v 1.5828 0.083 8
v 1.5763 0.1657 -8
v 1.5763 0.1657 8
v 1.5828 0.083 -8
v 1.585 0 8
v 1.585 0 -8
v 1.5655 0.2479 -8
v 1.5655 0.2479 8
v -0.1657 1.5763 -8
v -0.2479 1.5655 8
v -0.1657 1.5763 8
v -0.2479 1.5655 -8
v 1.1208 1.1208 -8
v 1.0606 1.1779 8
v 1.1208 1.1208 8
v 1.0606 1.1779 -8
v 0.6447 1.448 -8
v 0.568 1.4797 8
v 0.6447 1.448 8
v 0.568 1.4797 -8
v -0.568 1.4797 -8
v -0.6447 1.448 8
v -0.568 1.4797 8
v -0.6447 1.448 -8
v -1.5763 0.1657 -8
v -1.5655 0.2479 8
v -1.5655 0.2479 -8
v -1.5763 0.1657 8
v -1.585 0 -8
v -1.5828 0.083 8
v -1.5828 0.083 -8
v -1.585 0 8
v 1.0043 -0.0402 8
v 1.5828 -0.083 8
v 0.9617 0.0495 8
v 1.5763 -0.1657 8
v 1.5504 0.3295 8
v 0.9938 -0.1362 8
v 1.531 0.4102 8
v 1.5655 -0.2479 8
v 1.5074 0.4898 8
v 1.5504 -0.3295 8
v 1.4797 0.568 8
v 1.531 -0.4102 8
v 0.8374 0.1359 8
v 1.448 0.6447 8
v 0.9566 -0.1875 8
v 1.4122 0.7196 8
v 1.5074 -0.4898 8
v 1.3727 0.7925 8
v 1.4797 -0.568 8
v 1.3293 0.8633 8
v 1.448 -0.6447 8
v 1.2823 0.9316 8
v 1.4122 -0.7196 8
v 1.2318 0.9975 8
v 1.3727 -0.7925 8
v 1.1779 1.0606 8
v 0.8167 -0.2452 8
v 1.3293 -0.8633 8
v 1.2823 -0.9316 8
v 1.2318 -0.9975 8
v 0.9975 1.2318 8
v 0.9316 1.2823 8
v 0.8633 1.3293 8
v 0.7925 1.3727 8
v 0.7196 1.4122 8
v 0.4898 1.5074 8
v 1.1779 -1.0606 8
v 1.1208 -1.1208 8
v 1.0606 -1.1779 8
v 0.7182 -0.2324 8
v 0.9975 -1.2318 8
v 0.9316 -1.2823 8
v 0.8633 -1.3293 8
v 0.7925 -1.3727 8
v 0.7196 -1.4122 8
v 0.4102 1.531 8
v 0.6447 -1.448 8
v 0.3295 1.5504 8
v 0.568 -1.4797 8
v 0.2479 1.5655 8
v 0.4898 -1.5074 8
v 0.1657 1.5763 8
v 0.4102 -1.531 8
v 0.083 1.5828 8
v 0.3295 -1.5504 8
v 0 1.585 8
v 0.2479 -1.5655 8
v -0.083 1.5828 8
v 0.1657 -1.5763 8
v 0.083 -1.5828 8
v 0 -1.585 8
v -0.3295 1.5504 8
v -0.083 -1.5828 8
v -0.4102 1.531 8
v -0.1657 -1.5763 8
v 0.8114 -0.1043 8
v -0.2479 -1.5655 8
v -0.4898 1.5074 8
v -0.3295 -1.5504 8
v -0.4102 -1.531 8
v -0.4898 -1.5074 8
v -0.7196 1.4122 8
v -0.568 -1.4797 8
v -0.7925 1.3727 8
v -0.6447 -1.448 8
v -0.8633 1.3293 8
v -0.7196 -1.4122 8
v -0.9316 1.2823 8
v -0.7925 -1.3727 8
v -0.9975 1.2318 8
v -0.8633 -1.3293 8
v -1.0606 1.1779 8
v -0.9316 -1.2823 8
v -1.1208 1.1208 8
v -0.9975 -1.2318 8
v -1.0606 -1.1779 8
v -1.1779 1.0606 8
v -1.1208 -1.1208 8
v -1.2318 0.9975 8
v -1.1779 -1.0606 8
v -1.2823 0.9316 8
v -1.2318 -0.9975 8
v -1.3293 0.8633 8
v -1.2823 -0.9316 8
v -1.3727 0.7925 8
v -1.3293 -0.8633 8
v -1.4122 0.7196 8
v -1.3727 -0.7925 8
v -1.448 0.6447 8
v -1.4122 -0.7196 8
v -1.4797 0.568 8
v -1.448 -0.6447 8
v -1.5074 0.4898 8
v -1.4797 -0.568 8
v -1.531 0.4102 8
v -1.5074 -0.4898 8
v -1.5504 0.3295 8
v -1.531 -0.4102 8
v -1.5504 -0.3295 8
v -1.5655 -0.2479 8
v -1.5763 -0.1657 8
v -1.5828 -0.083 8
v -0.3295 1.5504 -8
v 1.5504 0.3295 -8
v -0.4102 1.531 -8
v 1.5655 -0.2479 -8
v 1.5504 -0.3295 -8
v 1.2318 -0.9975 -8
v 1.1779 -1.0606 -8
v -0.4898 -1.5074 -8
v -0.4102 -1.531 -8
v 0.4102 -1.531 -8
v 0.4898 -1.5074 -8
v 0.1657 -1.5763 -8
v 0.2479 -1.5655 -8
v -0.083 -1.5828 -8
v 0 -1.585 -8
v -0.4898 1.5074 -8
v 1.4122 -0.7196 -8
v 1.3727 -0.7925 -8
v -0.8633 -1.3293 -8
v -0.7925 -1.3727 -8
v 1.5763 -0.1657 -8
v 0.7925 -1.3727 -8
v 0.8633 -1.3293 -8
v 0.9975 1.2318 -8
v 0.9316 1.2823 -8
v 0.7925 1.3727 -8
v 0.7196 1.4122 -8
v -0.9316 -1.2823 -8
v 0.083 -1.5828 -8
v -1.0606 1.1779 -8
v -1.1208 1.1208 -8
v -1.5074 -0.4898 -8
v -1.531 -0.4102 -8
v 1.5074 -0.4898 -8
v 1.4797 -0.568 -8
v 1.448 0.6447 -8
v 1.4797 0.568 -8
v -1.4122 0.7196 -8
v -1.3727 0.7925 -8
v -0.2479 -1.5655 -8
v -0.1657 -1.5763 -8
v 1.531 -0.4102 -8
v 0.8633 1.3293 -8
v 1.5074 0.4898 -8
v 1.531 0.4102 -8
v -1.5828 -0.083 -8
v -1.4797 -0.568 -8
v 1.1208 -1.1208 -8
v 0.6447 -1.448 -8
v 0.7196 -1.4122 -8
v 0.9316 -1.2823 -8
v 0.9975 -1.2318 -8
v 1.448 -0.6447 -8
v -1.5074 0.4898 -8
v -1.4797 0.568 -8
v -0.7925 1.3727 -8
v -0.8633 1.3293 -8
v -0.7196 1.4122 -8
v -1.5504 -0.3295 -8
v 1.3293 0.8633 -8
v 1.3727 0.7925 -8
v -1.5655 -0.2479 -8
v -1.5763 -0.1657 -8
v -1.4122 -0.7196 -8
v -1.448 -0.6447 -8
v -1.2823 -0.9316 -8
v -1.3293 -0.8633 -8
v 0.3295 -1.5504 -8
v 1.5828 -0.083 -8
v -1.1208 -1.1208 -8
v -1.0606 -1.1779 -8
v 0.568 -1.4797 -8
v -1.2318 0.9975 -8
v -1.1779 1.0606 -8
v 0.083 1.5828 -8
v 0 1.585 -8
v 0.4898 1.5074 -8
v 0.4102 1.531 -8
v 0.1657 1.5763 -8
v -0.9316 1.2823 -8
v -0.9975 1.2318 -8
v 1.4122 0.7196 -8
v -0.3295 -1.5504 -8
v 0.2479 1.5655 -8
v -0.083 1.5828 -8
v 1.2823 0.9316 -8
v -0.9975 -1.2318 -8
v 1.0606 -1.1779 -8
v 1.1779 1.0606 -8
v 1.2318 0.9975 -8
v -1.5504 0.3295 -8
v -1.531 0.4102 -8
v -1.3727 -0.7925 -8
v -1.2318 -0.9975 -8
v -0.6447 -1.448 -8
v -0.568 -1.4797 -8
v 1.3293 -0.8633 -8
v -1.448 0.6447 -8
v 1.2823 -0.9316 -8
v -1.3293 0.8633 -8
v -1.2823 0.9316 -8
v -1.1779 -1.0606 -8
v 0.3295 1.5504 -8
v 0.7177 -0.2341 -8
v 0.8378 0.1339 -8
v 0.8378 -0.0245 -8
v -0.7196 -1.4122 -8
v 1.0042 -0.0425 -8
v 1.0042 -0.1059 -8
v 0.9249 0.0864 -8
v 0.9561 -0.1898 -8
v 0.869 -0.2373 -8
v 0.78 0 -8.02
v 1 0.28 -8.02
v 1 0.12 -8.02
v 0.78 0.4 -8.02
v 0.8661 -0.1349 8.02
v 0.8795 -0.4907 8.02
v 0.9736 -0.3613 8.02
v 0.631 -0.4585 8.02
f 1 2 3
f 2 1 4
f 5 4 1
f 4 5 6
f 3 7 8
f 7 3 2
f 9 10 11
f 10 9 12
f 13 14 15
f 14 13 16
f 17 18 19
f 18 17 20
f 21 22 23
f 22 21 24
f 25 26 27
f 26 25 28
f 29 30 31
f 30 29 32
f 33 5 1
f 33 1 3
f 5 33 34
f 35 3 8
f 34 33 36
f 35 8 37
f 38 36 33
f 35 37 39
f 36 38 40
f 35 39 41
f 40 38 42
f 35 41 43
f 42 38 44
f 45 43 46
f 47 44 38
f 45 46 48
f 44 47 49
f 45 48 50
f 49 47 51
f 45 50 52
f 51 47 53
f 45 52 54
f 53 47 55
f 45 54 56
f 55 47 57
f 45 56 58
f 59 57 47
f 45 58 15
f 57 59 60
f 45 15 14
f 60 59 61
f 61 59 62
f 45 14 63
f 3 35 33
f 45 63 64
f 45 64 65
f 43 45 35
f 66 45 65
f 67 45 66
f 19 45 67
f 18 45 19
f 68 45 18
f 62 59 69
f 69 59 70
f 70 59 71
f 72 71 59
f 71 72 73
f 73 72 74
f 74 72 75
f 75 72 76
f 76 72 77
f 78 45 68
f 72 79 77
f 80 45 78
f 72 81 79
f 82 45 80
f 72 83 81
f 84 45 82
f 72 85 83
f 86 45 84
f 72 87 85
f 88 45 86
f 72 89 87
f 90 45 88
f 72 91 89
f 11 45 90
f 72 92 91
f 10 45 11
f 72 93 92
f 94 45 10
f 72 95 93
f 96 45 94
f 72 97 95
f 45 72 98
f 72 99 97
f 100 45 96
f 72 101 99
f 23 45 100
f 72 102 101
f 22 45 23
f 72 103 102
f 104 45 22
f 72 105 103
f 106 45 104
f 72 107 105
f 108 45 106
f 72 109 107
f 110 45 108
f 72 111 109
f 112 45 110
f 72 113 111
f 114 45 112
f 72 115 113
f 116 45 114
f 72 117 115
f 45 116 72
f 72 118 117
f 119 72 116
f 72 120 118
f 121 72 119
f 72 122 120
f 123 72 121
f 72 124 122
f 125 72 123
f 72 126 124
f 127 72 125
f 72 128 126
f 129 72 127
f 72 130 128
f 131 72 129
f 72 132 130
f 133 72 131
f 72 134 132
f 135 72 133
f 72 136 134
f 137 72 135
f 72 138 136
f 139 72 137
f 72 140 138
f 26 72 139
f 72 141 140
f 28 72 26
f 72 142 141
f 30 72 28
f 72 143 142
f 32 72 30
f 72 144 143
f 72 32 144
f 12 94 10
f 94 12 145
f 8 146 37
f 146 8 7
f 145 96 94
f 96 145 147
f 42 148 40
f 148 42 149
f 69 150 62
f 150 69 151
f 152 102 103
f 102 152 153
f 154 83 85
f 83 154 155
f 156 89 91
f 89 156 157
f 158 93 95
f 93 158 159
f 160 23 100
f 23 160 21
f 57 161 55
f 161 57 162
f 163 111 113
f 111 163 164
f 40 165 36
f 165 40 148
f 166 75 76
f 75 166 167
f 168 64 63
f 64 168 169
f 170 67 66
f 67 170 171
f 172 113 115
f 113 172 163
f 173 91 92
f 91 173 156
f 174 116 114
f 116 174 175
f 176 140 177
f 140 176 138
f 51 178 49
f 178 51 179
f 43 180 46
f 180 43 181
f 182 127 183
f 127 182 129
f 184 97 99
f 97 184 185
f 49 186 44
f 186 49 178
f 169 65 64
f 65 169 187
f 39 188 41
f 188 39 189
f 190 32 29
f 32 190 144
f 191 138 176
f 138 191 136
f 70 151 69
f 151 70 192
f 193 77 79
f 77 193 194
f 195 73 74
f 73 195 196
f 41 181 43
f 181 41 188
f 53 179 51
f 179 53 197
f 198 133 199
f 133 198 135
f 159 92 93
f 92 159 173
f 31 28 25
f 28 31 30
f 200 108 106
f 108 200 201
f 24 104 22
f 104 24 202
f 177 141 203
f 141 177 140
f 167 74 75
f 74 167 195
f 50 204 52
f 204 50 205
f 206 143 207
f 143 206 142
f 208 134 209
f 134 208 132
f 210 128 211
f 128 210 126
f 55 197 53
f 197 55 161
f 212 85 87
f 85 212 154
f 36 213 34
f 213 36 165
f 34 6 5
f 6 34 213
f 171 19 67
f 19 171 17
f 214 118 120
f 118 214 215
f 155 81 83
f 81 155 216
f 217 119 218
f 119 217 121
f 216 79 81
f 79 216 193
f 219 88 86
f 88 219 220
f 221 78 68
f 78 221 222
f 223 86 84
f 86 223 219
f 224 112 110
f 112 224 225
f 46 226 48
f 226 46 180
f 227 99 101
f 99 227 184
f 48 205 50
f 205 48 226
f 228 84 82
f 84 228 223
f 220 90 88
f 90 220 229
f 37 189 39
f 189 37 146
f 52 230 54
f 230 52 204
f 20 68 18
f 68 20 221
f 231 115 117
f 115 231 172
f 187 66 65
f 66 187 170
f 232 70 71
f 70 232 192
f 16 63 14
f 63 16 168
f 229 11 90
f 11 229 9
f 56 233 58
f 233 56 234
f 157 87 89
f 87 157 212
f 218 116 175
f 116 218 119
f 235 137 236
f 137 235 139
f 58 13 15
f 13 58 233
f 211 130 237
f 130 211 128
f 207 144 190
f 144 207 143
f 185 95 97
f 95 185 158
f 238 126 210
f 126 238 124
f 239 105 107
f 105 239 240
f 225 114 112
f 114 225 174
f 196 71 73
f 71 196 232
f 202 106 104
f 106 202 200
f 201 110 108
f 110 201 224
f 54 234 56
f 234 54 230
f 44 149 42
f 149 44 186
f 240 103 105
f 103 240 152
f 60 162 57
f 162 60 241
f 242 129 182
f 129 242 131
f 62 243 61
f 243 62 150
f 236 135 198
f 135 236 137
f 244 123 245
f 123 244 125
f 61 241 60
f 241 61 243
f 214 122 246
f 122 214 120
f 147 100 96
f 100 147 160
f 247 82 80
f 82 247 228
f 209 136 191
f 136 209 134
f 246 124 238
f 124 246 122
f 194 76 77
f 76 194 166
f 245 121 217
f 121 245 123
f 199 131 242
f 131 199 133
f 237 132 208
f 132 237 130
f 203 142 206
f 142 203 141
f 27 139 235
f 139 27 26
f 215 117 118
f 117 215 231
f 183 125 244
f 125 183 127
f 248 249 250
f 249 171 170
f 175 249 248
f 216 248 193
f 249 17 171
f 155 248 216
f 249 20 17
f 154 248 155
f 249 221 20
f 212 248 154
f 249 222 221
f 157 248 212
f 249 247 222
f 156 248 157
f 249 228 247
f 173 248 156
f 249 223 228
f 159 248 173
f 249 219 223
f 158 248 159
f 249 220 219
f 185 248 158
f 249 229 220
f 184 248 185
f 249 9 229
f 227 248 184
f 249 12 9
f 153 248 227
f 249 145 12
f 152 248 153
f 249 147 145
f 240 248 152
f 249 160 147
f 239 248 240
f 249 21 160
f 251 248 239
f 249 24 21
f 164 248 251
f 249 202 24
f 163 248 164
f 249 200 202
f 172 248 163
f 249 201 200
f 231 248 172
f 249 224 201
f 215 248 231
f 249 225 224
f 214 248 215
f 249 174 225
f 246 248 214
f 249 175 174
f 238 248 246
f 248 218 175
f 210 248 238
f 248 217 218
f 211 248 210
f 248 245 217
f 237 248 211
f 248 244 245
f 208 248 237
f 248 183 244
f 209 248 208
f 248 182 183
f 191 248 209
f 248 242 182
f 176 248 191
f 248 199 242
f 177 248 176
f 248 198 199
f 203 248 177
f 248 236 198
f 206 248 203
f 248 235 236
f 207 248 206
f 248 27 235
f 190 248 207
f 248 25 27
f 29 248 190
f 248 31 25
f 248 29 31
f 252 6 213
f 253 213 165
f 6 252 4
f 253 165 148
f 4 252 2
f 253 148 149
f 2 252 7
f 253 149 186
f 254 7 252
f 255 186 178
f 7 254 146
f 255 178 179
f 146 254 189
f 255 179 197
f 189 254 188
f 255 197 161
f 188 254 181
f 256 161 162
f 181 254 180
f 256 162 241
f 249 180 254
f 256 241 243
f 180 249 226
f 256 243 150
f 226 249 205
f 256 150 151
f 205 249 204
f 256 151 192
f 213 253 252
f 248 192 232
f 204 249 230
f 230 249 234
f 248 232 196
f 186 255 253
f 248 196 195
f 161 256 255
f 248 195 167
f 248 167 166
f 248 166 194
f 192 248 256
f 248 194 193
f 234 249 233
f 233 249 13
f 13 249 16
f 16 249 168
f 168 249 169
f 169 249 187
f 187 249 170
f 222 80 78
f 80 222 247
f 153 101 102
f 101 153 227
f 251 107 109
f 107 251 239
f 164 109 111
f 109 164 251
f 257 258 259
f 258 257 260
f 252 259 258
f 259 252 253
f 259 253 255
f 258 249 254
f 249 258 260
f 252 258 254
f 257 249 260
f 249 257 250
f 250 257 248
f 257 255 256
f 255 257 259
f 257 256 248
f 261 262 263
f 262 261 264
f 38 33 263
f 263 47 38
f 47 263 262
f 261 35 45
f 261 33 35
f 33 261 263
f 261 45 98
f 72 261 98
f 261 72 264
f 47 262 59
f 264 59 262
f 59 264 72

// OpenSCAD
$fn = 120;

// =====================
// Target dimensions (mm)
// =====================
outer_diameter = 3.17;   // standoff body OD
length         = 16.0;   // overall length

// =====================
// Thread spec (approx. M2 external)
// =====================
thread_major_d = 2.0;    // major diameter
thread_pitch   = 0.4;    // pitch
thread_depth   = 0.22;   // radial depth (visual/printable)
thread_flat    = 0.12;   // flat at crest/root (mm)

// =====================
// Standoff layout
// =====================
// Make it a standoff pillar: smooth body with short threaded ends.
thread_end_len = 4.0;    // thread length on each end (mm)
mid_body_len   = length - 2*thread_end_len;

eps = 0.02;

// Derived radii
outer_r      = outer_diameter/2;
thread_r_maj = thread_major_d/2;
thread_r_min = thread_r_maj - thread_depth;

// Clamp to keep thread within the 3.17mm OD envelope
thread_r_maj_clamped = min(thread_r_maj, outer_r - eps);
thread_r_min_clamped = min(thread_r_min, thread_r_maj_clamped - eps);

// External helical thread (single-start) built by twisting a 2D profile along Z
module external_thread(major_r, pitch, len, minor_r, flat=0.12) {
    // 2D profile in (radius, z) plane; swept around Z with twist
    profile = [
        [minor_r, 0],
        [major_r, flat],
        [major_r, pitch - flat],
        [minor_r, pitch]
    ];

    linear_extrude(
        height = len,
        twist  = 360*len/pitch,
        slices = max(12, ceil(len*30)),
        convexity = 10
    )
        polygon(points=profile);
}

// Standoff pillar: smooth body + threaded ends, one connected solid
module standoff_pillar() {
    union() {
        // Main smooth standoff body (full OD)
        cylinder(h=length, r=outer_r, center=true);

        // Add external thread on bottom end (overlaps into body for connectivity)
        translate([0, 0, -length/2 - eps])
            external_thread(
                major_r = thread_r_maj_clamped,
                pitch   = thread_pitch,
                len     = thread_end_len + 2*eps,
                minor_r = thread_r_min_clamped,
                flat    = thread_flat
            );

        // Add external thread on top end (overlaps into body for connectivity)
        translate([0, 0, length/2 - thread_end_len - eps])
            external_thread(
                major_r = thread_r_maj_clamped,
                pitch   = thread_pitch,
                len     = thread_end_len + 2*eps,
                minor_r = thread_r_min_clamped,
                flat    = thread_flat
            );
    }
}

// Ensure OD is exactly 3.17mm everywhere
intersection() {
    standoff_pillar();
    cylinder(h=length + 2*eps, d=outer_diameter, center=true);
}
